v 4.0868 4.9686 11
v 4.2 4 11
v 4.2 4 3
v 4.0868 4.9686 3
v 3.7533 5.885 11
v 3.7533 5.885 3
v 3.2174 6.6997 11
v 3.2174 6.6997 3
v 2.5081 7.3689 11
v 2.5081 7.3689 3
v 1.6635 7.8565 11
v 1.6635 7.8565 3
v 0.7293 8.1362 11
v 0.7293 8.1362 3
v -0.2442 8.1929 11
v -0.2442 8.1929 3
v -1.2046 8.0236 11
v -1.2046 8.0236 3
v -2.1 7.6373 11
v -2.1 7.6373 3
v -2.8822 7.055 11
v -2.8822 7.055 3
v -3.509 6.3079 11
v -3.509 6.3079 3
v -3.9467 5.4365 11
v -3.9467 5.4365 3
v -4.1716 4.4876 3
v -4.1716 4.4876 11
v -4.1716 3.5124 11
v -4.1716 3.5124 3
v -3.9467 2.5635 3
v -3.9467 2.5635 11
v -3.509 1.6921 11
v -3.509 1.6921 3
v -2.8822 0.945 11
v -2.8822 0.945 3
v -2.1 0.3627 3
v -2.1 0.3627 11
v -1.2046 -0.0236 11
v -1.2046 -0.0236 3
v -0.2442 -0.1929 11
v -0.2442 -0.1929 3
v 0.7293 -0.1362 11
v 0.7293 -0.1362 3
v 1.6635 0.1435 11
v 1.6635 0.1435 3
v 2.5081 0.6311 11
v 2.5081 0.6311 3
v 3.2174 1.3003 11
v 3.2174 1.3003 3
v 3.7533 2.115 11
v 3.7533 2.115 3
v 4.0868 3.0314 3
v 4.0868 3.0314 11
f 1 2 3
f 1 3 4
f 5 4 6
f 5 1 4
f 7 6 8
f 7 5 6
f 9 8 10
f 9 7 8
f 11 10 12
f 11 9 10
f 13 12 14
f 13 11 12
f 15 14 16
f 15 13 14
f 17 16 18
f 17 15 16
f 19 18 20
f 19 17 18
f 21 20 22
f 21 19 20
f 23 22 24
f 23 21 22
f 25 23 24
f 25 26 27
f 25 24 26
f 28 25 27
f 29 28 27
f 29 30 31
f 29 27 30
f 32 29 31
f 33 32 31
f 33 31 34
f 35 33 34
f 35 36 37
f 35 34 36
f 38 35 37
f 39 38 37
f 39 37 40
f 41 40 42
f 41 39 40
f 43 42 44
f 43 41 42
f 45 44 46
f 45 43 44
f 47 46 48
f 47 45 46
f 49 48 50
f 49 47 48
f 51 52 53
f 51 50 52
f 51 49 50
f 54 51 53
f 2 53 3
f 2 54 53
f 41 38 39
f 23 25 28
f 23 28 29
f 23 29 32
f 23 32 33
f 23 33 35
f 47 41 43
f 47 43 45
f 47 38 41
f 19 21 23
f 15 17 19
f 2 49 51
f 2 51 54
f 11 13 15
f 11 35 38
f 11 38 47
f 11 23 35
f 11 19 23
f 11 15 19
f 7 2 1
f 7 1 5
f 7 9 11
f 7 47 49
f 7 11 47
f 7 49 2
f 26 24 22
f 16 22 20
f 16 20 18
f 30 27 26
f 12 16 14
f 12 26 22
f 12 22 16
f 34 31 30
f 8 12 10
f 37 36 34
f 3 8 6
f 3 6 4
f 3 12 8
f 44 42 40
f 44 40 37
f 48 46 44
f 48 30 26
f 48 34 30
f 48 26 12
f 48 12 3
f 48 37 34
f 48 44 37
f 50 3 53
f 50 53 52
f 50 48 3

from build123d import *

# Parameters (mm, degrees)
SKETCH_R          = 11
PAD_DEPTH         = 5
SKETCH001_R       = 11
PAD001_DEPTH      = 3
SKETCH002_R       = 4.2
PAD002_DEPTH      = 8
SKETCH003_W       = 25.13587
SKETCH003_H       = 8
POCKET_DEPTH      = 11.001
POCKET_DEPTH_BACK = -11.001


with BuildPart() as part:
    # Sketch → Pad (new body)
    with BuildSketch(Plane.XY):
        Circle(SKETCH_R)
        with BuildLine():
            ThreePointArc((-2.683282, 3.1), (0, -4.1), (2.683282, 3.1))
            Line((2.683282, 3.1), (-2.683282, 3.1))
        make_face(mode=Mode.SUBTRACT)
    extrude(amount=-PAD_DEPTH)

    # Sketch001 → Pad001 (join)
    with BuildSketch(Plane.XY.offset(3)):
        Circle(SKETCH001_R)
    extrude(amount=-PAD001_DEPTH)

    # Sketch002 → Pad002 (join)
    with BuildSketch(Plane.XY.offset(11)):
        with Locations((0, 4)):
            Circle(SKETCH002_R)
    extrude(amount=-PAD002_DEPTH)

    # Sketch003 → Pocket (cut, two sides)
    with BuildSketch(Plane.XZ) as pocket_sk:
        with Locations((0.504129, -1)):
            Rectangle(SKETCH003_W, SKETCH003_H)
    extrude(amount=-POCKET_DEPTH, mode=Mode.SUBTRACT)
    extrude(pocket_sk.sketch, amount=-POCKET_DEPTH_BACK, mode=Mode.SUBTRACT)


solid = part.part
